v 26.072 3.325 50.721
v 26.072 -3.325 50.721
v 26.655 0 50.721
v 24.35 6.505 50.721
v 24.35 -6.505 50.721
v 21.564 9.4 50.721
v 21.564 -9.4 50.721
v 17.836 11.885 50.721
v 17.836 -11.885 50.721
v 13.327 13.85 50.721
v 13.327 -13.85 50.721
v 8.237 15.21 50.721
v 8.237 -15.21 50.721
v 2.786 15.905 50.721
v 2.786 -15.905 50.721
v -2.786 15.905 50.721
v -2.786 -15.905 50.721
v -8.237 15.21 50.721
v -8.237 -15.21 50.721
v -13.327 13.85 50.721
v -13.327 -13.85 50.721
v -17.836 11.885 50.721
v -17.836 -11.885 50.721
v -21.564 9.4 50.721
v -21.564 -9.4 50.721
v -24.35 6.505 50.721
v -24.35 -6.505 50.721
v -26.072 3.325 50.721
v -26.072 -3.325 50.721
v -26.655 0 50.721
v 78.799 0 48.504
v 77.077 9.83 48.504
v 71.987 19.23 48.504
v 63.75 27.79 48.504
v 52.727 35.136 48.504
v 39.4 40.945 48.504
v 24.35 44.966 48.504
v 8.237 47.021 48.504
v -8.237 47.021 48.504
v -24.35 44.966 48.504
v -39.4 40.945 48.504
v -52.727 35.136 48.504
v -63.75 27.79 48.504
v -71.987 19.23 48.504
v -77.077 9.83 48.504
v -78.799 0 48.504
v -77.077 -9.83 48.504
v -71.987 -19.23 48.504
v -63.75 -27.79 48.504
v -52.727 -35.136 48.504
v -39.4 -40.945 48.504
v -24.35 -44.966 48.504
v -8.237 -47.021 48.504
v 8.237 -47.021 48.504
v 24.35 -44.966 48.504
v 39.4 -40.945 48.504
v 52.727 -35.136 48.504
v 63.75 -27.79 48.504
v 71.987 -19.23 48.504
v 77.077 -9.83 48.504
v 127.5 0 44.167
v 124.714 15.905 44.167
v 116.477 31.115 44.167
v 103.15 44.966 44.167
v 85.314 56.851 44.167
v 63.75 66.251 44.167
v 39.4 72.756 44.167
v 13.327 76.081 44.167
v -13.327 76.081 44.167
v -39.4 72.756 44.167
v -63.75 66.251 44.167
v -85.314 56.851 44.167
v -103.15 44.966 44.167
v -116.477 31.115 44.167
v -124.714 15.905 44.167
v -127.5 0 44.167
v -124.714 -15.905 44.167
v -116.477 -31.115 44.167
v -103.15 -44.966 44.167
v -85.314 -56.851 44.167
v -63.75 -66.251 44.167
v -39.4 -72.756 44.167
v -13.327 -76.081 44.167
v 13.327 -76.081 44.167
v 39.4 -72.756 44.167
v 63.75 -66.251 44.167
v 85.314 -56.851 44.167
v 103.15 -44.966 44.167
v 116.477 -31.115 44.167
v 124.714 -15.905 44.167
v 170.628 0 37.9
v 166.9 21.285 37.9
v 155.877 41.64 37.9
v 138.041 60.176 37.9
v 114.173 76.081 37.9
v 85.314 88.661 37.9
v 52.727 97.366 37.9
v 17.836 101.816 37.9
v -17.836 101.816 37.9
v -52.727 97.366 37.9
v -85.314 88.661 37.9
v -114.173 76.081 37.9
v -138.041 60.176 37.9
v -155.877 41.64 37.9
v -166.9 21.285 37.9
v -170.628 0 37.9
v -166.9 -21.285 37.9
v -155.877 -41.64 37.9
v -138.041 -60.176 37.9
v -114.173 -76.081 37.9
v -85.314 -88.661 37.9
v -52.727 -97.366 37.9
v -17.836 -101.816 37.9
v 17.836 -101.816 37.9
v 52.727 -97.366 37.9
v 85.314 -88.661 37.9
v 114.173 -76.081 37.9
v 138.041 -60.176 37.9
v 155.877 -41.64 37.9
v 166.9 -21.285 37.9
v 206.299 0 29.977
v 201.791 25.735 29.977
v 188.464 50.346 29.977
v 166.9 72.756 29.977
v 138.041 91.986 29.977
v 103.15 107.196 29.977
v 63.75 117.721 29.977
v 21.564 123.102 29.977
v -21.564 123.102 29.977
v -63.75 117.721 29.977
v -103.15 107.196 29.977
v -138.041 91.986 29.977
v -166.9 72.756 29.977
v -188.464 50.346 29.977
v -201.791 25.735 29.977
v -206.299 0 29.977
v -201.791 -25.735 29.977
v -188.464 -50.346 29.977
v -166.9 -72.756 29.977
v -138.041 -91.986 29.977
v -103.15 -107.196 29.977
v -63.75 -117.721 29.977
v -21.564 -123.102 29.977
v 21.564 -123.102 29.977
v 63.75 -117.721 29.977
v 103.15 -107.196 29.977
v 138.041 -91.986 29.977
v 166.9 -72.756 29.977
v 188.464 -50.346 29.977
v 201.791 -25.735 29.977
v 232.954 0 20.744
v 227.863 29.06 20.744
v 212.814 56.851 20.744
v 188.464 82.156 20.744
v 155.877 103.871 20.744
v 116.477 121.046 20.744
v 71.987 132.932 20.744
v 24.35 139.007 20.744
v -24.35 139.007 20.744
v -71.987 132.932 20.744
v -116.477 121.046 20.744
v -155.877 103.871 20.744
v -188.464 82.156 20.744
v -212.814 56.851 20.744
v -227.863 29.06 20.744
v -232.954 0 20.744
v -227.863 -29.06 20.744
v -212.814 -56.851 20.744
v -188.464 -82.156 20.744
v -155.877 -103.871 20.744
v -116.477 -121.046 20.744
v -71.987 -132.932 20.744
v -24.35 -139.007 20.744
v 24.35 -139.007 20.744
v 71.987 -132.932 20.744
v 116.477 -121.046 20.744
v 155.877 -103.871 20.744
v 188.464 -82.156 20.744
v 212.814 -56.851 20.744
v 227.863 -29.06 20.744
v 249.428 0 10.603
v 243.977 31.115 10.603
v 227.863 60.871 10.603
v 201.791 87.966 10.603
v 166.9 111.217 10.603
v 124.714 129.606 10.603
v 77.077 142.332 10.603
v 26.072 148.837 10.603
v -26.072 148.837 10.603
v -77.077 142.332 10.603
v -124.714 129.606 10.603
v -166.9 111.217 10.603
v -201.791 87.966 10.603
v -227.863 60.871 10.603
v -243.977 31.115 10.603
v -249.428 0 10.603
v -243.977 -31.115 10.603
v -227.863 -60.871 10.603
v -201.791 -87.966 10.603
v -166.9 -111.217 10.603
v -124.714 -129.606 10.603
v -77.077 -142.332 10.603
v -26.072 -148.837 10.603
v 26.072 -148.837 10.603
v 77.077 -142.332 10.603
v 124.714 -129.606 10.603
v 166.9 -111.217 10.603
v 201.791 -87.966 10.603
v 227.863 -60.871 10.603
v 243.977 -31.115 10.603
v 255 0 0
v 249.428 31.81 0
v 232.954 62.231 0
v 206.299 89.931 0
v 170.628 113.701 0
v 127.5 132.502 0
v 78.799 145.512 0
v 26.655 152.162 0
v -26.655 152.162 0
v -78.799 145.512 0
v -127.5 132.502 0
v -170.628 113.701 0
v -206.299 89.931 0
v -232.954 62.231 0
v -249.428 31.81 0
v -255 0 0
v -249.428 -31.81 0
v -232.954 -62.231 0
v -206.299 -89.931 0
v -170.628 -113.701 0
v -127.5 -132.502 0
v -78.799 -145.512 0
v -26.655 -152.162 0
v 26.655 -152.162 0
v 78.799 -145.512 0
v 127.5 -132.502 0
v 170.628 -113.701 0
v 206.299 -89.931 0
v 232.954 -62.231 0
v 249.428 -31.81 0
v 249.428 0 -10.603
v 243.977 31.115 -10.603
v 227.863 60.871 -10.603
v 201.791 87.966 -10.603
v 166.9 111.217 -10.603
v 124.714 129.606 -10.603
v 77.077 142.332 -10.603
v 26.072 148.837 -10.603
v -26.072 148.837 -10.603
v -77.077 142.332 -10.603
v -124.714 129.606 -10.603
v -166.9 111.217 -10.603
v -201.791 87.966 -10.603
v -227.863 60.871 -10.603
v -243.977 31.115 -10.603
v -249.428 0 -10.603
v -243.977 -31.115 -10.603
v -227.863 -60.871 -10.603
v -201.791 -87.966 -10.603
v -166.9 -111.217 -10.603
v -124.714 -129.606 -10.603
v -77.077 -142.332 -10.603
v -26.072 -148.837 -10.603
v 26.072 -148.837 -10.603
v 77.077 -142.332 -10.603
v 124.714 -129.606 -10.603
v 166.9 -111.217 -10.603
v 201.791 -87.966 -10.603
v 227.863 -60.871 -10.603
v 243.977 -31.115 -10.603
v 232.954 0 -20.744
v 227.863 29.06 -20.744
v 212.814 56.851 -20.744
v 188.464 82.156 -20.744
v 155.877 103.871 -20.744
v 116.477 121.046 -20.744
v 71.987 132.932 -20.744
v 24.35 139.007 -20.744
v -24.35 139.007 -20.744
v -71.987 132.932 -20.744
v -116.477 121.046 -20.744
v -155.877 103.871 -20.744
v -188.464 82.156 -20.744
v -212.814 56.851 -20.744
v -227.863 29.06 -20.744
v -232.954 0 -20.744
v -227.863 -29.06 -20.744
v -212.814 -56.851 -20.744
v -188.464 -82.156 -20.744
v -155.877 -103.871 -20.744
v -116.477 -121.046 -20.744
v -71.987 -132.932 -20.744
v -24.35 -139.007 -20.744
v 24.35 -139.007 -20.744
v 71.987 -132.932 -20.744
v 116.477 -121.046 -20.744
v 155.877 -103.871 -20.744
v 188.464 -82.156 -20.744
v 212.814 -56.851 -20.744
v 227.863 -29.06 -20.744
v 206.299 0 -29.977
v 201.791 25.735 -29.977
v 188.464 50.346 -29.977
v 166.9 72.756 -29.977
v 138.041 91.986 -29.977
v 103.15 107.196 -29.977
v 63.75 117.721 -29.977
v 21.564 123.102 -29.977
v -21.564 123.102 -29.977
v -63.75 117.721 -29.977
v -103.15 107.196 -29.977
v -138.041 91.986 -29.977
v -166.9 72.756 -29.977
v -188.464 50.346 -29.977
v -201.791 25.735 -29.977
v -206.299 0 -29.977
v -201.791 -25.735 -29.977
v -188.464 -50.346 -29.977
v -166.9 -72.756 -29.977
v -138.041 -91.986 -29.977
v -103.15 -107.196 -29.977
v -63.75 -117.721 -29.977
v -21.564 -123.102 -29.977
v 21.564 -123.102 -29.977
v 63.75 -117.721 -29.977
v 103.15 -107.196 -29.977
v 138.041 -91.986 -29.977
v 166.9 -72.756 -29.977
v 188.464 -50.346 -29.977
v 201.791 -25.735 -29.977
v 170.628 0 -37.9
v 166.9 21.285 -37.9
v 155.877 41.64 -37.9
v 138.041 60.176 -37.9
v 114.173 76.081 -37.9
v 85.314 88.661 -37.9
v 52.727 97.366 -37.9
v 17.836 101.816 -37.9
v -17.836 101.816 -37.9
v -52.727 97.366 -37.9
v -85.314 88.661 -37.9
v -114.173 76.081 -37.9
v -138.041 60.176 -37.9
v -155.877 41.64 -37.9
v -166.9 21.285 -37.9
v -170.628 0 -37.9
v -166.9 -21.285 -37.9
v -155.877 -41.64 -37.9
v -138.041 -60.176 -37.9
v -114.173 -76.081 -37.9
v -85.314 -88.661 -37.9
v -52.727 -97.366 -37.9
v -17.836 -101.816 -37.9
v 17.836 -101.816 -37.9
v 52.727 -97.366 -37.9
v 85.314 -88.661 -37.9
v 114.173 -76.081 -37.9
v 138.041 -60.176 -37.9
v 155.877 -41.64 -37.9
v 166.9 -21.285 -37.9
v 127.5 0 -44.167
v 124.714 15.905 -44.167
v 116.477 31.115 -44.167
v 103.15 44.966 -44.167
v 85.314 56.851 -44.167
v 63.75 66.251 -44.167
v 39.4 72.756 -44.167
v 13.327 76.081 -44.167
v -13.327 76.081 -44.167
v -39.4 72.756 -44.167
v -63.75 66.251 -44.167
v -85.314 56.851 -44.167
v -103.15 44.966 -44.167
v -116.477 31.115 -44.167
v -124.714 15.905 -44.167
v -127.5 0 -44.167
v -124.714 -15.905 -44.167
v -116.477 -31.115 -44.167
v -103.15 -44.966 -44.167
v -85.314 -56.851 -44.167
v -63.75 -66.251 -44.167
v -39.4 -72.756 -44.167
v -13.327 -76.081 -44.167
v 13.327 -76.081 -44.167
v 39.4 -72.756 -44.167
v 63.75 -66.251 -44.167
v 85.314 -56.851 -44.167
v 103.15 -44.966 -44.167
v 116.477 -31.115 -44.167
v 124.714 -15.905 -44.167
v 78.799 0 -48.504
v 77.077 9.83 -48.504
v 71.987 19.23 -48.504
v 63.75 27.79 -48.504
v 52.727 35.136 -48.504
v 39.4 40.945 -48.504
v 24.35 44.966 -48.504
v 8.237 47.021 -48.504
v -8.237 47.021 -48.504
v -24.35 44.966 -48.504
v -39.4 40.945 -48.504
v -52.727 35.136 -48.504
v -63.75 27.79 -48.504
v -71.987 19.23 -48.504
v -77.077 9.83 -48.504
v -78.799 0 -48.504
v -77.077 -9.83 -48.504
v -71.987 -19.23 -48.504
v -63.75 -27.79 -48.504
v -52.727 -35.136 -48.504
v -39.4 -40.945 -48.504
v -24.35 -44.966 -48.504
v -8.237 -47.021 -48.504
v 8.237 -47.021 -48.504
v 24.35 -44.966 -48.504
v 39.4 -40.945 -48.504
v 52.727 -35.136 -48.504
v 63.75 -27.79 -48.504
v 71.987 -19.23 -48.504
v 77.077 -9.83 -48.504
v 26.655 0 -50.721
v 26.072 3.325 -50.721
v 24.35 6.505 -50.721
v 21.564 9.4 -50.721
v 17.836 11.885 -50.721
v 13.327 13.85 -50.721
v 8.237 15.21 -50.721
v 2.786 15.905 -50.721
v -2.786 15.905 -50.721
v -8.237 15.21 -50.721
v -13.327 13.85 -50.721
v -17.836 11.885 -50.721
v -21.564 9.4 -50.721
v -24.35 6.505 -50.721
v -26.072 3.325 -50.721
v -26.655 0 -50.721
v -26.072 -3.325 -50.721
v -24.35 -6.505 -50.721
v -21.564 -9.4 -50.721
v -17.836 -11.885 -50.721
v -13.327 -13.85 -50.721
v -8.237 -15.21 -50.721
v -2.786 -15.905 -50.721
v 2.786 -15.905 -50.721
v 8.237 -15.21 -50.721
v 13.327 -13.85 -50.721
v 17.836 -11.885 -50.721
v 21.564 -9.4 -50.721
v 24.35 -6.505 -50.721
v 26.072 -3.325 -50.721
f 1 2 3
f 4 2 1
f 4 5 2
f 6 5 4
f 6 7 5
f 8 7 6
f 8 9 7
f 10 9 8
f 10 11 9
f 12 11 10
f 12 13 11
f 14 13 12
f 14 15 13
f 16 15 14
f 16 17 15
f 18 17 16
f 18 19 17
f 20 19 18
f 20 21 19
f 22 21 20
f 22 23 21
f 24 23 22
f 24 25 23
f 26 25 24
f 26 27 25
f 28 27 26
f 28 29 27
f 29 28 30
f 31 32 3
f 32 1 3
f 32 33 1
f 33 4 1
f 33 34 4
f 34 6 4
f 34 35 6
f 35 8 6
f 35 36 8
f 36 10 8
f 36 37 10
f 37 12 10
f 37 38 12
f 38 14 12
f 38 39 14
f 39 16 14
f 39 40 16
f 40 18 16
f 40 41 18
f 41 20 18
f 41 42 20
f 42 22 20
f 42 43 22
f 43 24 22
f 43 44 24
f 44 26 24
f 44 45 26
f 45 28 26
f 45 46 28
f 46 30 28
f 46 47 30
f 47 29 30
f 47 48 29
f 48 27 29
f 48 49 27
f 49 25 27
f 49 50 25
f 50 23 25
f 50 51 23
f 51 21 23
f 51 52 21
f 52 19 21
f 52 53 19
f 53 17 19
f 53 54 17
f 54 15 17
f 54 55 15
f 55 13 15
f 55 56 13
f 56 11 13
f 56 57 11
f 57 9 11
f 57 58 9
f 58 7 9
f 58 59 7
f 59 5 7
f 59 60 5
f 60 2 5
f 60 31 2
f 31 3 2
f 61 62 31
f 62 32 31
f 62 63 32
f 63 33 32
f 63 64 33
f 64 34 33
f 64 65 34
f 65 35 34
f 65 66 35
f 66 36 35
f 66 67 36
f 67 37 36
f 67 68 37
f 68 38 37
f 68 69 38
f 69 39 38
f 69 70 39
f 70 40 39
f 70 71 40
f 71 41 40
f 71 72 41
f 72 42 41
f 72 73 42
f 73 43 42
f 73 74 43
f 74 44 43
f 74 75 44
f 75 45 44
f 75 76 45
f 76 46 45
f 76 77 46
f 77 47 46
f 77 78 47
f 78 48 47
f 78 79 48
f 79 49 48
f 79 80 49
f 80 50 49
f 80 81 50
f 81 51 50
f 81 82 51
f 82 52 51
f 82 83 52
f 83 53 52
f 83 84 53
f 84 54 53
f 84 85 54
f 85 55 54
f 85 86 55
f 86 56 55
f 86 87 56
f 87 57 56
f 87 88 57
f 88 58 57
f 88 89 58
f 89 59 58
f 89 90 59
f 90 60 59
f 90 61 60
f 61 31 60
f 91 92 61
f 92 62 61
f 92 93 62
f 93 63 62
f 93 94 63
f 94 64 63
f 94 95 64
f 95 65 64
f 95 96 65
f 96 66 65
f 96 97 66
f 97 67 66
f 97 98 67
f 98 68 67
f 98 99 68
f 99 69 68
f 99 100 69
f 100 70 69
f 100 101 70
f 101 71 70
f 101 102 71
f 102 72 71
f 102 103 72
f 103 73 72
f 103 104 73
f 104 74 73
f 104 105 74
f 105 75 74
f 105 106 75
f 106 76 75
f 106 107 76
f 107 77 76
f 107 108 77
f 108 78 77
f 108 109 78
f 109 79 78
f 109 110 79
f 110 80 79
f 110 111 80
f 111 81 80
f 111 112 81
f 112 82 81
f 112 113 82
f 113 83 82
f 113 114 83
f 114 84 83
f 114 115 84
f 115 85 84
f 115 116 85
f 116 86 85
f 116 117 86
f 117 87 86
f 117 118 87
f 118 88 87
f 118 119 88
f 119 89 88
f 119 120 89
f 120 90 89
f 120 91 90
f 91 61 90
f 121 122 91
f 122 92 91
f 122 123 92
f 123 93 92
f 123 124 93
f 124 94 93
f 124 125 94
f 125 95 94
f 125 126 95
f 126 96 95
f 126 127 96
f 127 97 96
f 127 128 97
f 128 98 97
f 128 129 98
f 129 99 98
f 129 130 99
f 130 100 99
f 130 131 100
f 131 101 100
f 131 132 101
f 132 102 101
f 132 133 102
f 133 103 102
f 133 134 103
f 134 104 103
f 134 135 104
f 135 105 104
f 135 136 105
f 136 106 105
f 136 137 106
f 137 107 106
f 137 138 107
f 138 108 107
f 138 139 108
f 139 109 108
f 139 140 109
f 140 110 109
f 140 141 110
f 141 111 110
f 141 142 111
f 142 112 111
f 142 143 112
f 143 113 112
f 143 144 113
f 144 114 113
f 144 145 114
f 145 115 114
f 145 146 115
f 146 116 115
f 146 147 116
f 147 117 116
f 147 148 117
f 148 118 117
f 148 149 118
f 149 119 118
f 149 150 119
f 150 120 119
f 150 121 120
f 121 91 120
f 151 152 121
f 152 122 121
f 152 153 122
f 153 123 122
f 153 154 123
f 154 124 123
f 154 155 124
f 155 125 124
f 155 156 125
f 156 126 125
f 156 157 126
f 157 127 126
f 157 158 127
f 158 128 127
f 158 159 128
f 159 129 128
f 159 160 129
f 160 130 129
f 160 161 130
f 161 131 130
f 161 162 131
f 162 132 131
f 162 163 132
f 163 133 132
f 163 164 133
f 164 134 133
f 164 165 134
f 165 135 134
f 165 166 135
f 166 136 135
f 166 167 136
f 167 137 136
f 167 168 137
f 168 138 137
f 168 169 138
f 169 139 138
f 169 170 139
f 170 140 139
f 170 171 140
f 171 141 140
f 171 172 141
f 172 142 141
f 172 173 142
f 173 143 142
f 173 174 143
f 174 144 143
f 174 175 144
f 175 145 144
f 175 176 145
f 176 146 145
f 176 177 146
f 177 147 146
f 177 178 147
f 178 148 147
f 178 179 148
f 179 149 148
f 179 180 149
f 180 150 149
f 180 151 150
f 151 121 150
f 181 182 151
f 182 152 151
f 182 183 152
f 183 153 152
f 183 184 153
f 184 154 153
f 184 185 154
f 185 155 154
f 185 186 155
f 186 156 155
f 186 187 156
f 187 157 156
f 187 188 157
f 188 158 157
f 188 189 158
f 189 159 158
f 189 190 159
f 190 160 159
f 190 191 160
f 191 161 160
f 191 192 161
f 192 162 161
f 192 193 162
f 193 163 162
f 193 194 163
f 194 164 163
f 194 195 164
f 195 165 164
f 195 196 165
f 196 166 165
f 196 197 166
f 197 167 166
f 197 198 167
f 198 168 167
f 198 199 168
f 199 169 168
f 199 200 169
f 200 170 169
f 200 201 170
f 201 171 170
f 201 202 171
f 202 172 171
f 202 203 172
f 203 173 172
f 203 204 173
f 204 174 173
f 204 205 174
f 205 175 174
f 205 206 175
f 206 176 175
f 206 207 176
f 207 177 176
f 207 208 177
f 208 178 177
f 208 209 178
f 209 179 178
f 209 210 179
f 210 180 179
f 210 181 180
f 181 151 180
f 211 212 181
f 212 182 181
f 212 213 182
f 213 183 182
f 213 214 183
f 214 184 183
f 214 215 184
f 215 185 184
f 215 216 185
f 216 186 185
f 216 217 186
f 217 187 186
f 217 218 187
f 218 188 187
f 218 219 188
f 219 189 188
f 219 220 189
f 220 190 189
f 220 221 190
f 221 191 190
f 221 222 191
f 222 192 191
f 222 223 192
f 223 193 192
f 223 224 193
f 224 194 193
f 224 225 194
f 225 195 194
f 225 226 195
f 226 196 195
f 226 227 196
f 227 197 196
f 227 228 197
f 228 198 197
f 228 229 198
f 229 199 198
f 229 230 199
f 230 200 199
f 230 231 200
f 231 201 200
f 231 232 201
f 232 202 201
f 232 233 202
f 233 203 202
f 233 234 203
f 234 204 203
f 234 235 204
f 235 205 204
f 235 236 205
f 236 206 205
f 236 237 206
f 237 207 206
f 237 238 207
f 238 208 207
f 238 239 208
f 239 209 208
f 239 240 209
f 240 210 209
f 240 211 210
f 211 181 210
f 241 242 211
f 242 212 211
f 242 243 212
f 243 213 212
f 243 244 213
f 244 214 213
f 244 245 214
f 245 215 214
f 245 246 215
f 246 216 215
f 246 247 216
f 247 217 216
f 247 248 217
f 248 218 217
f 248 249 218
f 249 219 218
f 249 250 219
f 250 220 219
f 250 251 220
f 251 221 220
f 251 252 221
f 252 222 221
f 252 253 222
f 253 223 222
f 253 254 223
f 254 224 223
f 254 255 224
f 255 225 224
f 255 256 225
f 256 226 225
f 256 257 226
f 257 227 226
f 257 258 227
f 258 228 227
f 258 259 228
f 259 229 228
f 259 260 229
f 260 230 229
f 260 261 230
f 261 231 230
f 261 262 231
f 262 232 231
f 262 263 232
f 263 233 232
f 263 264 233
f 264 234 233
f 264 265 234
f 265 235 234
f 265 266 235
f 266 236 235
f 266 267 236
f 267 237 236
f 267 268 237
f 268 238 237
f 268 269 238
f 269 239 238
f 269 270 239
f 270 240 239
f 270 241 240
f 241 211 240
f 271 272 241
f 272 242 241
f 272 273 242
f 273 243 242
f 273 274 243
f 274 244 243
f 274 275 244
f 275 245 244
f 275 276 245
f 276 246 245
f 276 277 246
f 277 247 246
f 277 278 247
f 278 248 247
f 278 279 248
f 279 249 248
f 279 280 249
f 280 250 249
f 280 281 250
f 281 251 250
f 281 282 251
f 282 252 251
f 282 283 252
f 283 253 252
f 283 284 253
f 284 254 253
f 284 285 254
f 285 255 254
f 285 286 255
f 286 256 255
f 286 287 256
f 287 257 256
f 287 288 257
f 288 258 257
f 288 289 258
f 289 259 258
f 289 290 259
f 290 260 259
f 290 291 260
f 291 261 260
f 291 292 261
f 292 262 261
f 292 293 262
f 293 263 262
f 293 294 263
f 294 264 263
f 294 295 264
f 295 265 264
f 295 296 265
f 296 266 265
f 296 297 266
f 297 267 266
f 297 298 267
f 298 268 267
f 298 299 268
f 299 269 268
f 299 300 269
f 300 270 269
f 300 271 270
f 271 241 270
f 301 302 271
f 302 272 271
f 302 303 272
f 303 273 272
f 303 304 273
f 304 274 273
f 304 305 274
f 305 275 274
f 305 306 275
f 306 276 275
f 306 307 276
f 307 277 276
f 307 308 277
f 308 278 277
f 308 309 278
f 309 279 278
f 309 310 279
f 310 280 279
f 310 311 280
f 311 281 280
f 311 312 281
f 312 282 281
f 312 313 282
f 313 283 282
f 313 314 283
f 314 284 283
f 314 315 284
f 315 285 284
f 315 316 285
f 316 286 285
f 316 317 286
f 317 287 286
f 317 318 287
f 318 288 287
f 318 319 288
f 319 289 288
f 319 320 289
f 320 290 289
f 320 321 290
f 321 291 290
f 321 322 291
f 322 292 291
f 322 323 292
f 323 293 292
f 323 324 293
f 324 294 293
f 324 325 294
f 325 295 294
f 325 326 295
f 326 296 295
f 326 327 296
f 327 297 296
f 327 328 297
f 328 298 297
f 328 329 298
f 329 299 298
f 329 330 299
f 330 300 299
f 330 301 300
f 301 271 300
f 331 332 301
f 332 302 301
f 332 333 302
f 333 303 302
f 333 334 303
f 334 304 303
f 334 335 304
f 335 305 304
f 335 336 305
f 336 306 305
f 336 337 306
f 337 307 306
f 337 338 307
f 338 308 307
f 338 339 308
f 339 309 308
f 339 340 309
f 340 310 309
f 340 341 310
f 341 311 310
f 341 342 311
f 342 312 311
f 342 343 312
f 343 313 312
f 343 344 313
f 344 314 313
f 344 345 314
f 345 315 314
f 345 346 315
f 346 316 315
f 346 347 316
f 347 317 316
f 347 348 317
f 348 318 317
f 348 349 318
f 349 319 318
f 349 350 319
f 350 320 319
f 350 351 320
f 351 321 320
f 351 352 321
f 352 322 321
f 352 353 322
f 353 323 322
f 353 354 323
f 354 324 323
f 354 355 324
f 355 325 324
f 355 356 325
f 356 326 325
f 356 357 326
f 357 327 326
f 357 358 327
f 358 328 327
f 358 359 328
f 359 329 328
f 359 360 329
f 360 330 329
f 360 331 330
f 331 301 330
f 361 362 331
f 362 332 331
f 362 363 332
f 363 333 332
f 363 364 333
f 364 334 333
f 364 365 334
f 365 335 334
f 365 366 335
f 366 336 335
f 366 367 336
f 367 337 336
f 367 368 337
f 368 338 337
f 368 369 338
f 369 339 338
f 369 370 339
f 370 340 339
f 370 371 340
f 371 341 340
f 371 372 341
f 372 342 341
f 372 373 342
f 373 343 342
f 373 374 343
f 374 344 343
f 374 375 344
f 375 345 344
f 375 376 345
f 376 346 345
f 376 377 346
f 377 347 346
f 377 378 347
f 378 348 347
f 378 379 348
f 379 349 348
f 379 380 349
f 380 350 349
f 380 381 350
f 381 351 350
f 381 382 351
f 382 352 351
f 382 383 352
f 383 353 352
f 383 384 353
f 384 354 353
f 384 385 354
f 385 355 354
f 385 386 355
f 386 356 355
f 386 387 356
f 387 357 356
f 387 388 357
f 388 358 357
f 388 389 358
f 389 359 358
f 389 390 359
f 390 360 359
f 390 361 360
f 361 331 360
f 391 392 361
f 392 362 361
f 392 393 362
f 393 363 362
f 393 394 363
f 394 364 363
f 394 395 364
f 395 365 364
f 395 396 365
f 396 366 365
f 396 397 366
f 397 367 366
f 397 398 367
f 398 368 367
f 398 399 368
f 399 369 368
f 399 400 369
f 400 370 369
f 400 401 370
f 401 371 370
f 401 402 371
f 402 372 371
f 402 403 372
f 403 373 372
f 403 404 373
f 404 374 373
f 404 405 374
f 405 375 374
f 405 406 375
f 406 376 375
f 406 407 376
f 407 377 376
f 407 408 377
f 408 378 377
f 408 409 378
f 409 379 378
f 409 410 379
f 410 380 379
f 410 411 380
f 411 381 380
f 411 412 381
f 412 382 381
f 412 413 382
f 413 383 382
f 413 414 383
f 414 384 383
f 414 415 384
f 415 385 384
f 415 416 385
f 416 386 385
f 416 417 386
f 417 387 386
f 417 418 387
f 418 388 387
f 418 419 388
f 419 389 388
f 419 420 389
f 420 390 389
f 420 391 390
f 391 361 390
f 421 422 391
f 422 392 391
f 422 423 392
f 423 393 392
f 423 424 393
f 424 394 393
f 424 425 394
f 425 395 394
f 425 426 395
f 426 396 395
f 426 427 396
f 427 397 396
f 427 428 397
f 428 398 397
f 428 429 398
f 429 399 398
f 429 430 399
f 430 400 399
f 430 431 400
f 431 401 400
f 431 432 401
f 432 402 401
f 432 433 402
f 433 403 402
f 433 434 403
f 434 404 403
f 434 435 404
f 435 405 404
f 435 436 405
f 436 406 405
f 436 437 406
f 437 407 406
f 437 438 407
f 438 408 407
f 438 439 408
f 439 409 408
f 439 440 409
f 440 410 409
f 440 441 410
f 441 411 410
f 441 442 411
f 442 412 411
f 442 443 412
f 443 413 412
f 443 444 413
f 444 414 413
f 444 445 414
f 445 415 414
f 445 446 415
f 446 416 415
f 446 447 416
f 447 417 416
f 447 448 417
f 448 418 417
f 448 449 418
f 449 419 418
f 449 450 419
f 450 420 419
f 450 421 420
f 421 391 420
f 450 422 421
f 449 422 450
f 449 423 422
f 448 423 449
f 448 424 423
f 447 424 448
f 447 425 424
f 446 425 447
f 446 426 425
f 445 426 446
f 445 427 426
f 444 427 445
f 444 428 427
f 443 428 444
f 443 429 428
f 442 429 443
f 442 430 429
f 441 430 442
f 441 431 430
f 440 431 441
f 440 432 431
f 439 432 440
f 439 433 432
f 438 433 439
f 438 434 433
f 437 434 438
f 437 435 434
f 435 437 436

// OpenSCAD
// Generated by SolidPython 1.0.1 on 2020-07-29 00:46:51


scale(v = [15, 9, 3]) {
	sphere(r = 17);
}
/***********************************************
*********      SolidPython code:      **********
************************************************
 
# import packages: SolidPython
from solid import *
from solid.utils import *
from itertools import chain, combinations, permutations


class Resize:

    def __init__(self, scad_file):
        self.scad_file = scad_file
        #self.scad_file = import_scad(scad_file)
        # cone/cylinder param:
        self.r1 = 0
        self.r2 = 0
        self.h = 0
        # rectangular prism param:
        self.w = 0
        self.l = 0
        # ellipse param:
        self.r = 0

    # import OpenScad code (file name corresponds to shape)


    # classify shape + parameters
    def assign(self, param1, param2, param3):
        if self.scad_file == 'cone.scad':
            self.r1 = param1
            self.r2 = param2
            self.h = param3
        elif self.scad_file == 'cylinder.scad':
            self.r1 = param1
            self.r2 = param2
            self.h = param3
        elif self.scad_file == 'rectangularPrism.scad':
            self.h = param1
            self.l = param2
            self.w = param3
        else:
            self.r = param1
            self.h = param2

    # resize parameters
    def iterate(self):
        x = range(3, 20, 2)
        i = 1
        if self.scad_file == 'cone.scad':
            tempList = list(permutations(x, 2))
            for temp in tempList:
                param1 = temp[0]
                param2 = temp[1]
                filepath = 'produced_scad_files/' + 'cone' + str(param1) + '_' + str(param2) + '_' + '.scad'
                scad_render_to_file(cylinder(h=param1, r1=param2, r2=0), filepath)

        elif self.scad_file == 'cylinder.scad':
            tempList = list(permutations(x, 3))
            for temp in tempList:
                param1 = temp[0]
                param2 = temp[1]
                filepath = 'produced_scad_files/' + 'cylinder' + str(param1) + '_' + str(param2) + '_' + '.scad'
                scad_render_to_file(cylinder(h=param1, r1=param2, r2=param2), filepath)

        elif self.scad_file == 'rectangularPrism.scad':
            tempList = list(permutations(x, 3))
            for temp in tempList:
                param1 = temp[0]
                param2 = temp[1]
                param3 = temp[2]
                filepath = 'produced_scad_files/' + 'rectangularPrism' + str(param1) + '_' + str(param2) + '_' + str(
                    param3) + '.scad'
                scad_render_to_file(cube(size=(param1, param2, param3)), filepath)

        elif self.scad_file == 'ellipse.scad':
            tempList = list(permutations(x, 4))
            for temp in tempList:
                param1 = temp[0]
                param2 = temp[1]
                param3 = temp[2]
                param4 = temp[3]
                filepath = 'produced_scad_files/' + 'ellipse' + str(param1) + '_' + str(param2) + '_' + str(param3) + '_' + str(param4) + '.scad'
                scad_render_to_file(scale([param1, param2, param3])(sphere(r=param4)), filepath)

    def render_to_scadfile(self):
        scad_render_to_file(scad, 'example.scad') 
 
************************************************/
